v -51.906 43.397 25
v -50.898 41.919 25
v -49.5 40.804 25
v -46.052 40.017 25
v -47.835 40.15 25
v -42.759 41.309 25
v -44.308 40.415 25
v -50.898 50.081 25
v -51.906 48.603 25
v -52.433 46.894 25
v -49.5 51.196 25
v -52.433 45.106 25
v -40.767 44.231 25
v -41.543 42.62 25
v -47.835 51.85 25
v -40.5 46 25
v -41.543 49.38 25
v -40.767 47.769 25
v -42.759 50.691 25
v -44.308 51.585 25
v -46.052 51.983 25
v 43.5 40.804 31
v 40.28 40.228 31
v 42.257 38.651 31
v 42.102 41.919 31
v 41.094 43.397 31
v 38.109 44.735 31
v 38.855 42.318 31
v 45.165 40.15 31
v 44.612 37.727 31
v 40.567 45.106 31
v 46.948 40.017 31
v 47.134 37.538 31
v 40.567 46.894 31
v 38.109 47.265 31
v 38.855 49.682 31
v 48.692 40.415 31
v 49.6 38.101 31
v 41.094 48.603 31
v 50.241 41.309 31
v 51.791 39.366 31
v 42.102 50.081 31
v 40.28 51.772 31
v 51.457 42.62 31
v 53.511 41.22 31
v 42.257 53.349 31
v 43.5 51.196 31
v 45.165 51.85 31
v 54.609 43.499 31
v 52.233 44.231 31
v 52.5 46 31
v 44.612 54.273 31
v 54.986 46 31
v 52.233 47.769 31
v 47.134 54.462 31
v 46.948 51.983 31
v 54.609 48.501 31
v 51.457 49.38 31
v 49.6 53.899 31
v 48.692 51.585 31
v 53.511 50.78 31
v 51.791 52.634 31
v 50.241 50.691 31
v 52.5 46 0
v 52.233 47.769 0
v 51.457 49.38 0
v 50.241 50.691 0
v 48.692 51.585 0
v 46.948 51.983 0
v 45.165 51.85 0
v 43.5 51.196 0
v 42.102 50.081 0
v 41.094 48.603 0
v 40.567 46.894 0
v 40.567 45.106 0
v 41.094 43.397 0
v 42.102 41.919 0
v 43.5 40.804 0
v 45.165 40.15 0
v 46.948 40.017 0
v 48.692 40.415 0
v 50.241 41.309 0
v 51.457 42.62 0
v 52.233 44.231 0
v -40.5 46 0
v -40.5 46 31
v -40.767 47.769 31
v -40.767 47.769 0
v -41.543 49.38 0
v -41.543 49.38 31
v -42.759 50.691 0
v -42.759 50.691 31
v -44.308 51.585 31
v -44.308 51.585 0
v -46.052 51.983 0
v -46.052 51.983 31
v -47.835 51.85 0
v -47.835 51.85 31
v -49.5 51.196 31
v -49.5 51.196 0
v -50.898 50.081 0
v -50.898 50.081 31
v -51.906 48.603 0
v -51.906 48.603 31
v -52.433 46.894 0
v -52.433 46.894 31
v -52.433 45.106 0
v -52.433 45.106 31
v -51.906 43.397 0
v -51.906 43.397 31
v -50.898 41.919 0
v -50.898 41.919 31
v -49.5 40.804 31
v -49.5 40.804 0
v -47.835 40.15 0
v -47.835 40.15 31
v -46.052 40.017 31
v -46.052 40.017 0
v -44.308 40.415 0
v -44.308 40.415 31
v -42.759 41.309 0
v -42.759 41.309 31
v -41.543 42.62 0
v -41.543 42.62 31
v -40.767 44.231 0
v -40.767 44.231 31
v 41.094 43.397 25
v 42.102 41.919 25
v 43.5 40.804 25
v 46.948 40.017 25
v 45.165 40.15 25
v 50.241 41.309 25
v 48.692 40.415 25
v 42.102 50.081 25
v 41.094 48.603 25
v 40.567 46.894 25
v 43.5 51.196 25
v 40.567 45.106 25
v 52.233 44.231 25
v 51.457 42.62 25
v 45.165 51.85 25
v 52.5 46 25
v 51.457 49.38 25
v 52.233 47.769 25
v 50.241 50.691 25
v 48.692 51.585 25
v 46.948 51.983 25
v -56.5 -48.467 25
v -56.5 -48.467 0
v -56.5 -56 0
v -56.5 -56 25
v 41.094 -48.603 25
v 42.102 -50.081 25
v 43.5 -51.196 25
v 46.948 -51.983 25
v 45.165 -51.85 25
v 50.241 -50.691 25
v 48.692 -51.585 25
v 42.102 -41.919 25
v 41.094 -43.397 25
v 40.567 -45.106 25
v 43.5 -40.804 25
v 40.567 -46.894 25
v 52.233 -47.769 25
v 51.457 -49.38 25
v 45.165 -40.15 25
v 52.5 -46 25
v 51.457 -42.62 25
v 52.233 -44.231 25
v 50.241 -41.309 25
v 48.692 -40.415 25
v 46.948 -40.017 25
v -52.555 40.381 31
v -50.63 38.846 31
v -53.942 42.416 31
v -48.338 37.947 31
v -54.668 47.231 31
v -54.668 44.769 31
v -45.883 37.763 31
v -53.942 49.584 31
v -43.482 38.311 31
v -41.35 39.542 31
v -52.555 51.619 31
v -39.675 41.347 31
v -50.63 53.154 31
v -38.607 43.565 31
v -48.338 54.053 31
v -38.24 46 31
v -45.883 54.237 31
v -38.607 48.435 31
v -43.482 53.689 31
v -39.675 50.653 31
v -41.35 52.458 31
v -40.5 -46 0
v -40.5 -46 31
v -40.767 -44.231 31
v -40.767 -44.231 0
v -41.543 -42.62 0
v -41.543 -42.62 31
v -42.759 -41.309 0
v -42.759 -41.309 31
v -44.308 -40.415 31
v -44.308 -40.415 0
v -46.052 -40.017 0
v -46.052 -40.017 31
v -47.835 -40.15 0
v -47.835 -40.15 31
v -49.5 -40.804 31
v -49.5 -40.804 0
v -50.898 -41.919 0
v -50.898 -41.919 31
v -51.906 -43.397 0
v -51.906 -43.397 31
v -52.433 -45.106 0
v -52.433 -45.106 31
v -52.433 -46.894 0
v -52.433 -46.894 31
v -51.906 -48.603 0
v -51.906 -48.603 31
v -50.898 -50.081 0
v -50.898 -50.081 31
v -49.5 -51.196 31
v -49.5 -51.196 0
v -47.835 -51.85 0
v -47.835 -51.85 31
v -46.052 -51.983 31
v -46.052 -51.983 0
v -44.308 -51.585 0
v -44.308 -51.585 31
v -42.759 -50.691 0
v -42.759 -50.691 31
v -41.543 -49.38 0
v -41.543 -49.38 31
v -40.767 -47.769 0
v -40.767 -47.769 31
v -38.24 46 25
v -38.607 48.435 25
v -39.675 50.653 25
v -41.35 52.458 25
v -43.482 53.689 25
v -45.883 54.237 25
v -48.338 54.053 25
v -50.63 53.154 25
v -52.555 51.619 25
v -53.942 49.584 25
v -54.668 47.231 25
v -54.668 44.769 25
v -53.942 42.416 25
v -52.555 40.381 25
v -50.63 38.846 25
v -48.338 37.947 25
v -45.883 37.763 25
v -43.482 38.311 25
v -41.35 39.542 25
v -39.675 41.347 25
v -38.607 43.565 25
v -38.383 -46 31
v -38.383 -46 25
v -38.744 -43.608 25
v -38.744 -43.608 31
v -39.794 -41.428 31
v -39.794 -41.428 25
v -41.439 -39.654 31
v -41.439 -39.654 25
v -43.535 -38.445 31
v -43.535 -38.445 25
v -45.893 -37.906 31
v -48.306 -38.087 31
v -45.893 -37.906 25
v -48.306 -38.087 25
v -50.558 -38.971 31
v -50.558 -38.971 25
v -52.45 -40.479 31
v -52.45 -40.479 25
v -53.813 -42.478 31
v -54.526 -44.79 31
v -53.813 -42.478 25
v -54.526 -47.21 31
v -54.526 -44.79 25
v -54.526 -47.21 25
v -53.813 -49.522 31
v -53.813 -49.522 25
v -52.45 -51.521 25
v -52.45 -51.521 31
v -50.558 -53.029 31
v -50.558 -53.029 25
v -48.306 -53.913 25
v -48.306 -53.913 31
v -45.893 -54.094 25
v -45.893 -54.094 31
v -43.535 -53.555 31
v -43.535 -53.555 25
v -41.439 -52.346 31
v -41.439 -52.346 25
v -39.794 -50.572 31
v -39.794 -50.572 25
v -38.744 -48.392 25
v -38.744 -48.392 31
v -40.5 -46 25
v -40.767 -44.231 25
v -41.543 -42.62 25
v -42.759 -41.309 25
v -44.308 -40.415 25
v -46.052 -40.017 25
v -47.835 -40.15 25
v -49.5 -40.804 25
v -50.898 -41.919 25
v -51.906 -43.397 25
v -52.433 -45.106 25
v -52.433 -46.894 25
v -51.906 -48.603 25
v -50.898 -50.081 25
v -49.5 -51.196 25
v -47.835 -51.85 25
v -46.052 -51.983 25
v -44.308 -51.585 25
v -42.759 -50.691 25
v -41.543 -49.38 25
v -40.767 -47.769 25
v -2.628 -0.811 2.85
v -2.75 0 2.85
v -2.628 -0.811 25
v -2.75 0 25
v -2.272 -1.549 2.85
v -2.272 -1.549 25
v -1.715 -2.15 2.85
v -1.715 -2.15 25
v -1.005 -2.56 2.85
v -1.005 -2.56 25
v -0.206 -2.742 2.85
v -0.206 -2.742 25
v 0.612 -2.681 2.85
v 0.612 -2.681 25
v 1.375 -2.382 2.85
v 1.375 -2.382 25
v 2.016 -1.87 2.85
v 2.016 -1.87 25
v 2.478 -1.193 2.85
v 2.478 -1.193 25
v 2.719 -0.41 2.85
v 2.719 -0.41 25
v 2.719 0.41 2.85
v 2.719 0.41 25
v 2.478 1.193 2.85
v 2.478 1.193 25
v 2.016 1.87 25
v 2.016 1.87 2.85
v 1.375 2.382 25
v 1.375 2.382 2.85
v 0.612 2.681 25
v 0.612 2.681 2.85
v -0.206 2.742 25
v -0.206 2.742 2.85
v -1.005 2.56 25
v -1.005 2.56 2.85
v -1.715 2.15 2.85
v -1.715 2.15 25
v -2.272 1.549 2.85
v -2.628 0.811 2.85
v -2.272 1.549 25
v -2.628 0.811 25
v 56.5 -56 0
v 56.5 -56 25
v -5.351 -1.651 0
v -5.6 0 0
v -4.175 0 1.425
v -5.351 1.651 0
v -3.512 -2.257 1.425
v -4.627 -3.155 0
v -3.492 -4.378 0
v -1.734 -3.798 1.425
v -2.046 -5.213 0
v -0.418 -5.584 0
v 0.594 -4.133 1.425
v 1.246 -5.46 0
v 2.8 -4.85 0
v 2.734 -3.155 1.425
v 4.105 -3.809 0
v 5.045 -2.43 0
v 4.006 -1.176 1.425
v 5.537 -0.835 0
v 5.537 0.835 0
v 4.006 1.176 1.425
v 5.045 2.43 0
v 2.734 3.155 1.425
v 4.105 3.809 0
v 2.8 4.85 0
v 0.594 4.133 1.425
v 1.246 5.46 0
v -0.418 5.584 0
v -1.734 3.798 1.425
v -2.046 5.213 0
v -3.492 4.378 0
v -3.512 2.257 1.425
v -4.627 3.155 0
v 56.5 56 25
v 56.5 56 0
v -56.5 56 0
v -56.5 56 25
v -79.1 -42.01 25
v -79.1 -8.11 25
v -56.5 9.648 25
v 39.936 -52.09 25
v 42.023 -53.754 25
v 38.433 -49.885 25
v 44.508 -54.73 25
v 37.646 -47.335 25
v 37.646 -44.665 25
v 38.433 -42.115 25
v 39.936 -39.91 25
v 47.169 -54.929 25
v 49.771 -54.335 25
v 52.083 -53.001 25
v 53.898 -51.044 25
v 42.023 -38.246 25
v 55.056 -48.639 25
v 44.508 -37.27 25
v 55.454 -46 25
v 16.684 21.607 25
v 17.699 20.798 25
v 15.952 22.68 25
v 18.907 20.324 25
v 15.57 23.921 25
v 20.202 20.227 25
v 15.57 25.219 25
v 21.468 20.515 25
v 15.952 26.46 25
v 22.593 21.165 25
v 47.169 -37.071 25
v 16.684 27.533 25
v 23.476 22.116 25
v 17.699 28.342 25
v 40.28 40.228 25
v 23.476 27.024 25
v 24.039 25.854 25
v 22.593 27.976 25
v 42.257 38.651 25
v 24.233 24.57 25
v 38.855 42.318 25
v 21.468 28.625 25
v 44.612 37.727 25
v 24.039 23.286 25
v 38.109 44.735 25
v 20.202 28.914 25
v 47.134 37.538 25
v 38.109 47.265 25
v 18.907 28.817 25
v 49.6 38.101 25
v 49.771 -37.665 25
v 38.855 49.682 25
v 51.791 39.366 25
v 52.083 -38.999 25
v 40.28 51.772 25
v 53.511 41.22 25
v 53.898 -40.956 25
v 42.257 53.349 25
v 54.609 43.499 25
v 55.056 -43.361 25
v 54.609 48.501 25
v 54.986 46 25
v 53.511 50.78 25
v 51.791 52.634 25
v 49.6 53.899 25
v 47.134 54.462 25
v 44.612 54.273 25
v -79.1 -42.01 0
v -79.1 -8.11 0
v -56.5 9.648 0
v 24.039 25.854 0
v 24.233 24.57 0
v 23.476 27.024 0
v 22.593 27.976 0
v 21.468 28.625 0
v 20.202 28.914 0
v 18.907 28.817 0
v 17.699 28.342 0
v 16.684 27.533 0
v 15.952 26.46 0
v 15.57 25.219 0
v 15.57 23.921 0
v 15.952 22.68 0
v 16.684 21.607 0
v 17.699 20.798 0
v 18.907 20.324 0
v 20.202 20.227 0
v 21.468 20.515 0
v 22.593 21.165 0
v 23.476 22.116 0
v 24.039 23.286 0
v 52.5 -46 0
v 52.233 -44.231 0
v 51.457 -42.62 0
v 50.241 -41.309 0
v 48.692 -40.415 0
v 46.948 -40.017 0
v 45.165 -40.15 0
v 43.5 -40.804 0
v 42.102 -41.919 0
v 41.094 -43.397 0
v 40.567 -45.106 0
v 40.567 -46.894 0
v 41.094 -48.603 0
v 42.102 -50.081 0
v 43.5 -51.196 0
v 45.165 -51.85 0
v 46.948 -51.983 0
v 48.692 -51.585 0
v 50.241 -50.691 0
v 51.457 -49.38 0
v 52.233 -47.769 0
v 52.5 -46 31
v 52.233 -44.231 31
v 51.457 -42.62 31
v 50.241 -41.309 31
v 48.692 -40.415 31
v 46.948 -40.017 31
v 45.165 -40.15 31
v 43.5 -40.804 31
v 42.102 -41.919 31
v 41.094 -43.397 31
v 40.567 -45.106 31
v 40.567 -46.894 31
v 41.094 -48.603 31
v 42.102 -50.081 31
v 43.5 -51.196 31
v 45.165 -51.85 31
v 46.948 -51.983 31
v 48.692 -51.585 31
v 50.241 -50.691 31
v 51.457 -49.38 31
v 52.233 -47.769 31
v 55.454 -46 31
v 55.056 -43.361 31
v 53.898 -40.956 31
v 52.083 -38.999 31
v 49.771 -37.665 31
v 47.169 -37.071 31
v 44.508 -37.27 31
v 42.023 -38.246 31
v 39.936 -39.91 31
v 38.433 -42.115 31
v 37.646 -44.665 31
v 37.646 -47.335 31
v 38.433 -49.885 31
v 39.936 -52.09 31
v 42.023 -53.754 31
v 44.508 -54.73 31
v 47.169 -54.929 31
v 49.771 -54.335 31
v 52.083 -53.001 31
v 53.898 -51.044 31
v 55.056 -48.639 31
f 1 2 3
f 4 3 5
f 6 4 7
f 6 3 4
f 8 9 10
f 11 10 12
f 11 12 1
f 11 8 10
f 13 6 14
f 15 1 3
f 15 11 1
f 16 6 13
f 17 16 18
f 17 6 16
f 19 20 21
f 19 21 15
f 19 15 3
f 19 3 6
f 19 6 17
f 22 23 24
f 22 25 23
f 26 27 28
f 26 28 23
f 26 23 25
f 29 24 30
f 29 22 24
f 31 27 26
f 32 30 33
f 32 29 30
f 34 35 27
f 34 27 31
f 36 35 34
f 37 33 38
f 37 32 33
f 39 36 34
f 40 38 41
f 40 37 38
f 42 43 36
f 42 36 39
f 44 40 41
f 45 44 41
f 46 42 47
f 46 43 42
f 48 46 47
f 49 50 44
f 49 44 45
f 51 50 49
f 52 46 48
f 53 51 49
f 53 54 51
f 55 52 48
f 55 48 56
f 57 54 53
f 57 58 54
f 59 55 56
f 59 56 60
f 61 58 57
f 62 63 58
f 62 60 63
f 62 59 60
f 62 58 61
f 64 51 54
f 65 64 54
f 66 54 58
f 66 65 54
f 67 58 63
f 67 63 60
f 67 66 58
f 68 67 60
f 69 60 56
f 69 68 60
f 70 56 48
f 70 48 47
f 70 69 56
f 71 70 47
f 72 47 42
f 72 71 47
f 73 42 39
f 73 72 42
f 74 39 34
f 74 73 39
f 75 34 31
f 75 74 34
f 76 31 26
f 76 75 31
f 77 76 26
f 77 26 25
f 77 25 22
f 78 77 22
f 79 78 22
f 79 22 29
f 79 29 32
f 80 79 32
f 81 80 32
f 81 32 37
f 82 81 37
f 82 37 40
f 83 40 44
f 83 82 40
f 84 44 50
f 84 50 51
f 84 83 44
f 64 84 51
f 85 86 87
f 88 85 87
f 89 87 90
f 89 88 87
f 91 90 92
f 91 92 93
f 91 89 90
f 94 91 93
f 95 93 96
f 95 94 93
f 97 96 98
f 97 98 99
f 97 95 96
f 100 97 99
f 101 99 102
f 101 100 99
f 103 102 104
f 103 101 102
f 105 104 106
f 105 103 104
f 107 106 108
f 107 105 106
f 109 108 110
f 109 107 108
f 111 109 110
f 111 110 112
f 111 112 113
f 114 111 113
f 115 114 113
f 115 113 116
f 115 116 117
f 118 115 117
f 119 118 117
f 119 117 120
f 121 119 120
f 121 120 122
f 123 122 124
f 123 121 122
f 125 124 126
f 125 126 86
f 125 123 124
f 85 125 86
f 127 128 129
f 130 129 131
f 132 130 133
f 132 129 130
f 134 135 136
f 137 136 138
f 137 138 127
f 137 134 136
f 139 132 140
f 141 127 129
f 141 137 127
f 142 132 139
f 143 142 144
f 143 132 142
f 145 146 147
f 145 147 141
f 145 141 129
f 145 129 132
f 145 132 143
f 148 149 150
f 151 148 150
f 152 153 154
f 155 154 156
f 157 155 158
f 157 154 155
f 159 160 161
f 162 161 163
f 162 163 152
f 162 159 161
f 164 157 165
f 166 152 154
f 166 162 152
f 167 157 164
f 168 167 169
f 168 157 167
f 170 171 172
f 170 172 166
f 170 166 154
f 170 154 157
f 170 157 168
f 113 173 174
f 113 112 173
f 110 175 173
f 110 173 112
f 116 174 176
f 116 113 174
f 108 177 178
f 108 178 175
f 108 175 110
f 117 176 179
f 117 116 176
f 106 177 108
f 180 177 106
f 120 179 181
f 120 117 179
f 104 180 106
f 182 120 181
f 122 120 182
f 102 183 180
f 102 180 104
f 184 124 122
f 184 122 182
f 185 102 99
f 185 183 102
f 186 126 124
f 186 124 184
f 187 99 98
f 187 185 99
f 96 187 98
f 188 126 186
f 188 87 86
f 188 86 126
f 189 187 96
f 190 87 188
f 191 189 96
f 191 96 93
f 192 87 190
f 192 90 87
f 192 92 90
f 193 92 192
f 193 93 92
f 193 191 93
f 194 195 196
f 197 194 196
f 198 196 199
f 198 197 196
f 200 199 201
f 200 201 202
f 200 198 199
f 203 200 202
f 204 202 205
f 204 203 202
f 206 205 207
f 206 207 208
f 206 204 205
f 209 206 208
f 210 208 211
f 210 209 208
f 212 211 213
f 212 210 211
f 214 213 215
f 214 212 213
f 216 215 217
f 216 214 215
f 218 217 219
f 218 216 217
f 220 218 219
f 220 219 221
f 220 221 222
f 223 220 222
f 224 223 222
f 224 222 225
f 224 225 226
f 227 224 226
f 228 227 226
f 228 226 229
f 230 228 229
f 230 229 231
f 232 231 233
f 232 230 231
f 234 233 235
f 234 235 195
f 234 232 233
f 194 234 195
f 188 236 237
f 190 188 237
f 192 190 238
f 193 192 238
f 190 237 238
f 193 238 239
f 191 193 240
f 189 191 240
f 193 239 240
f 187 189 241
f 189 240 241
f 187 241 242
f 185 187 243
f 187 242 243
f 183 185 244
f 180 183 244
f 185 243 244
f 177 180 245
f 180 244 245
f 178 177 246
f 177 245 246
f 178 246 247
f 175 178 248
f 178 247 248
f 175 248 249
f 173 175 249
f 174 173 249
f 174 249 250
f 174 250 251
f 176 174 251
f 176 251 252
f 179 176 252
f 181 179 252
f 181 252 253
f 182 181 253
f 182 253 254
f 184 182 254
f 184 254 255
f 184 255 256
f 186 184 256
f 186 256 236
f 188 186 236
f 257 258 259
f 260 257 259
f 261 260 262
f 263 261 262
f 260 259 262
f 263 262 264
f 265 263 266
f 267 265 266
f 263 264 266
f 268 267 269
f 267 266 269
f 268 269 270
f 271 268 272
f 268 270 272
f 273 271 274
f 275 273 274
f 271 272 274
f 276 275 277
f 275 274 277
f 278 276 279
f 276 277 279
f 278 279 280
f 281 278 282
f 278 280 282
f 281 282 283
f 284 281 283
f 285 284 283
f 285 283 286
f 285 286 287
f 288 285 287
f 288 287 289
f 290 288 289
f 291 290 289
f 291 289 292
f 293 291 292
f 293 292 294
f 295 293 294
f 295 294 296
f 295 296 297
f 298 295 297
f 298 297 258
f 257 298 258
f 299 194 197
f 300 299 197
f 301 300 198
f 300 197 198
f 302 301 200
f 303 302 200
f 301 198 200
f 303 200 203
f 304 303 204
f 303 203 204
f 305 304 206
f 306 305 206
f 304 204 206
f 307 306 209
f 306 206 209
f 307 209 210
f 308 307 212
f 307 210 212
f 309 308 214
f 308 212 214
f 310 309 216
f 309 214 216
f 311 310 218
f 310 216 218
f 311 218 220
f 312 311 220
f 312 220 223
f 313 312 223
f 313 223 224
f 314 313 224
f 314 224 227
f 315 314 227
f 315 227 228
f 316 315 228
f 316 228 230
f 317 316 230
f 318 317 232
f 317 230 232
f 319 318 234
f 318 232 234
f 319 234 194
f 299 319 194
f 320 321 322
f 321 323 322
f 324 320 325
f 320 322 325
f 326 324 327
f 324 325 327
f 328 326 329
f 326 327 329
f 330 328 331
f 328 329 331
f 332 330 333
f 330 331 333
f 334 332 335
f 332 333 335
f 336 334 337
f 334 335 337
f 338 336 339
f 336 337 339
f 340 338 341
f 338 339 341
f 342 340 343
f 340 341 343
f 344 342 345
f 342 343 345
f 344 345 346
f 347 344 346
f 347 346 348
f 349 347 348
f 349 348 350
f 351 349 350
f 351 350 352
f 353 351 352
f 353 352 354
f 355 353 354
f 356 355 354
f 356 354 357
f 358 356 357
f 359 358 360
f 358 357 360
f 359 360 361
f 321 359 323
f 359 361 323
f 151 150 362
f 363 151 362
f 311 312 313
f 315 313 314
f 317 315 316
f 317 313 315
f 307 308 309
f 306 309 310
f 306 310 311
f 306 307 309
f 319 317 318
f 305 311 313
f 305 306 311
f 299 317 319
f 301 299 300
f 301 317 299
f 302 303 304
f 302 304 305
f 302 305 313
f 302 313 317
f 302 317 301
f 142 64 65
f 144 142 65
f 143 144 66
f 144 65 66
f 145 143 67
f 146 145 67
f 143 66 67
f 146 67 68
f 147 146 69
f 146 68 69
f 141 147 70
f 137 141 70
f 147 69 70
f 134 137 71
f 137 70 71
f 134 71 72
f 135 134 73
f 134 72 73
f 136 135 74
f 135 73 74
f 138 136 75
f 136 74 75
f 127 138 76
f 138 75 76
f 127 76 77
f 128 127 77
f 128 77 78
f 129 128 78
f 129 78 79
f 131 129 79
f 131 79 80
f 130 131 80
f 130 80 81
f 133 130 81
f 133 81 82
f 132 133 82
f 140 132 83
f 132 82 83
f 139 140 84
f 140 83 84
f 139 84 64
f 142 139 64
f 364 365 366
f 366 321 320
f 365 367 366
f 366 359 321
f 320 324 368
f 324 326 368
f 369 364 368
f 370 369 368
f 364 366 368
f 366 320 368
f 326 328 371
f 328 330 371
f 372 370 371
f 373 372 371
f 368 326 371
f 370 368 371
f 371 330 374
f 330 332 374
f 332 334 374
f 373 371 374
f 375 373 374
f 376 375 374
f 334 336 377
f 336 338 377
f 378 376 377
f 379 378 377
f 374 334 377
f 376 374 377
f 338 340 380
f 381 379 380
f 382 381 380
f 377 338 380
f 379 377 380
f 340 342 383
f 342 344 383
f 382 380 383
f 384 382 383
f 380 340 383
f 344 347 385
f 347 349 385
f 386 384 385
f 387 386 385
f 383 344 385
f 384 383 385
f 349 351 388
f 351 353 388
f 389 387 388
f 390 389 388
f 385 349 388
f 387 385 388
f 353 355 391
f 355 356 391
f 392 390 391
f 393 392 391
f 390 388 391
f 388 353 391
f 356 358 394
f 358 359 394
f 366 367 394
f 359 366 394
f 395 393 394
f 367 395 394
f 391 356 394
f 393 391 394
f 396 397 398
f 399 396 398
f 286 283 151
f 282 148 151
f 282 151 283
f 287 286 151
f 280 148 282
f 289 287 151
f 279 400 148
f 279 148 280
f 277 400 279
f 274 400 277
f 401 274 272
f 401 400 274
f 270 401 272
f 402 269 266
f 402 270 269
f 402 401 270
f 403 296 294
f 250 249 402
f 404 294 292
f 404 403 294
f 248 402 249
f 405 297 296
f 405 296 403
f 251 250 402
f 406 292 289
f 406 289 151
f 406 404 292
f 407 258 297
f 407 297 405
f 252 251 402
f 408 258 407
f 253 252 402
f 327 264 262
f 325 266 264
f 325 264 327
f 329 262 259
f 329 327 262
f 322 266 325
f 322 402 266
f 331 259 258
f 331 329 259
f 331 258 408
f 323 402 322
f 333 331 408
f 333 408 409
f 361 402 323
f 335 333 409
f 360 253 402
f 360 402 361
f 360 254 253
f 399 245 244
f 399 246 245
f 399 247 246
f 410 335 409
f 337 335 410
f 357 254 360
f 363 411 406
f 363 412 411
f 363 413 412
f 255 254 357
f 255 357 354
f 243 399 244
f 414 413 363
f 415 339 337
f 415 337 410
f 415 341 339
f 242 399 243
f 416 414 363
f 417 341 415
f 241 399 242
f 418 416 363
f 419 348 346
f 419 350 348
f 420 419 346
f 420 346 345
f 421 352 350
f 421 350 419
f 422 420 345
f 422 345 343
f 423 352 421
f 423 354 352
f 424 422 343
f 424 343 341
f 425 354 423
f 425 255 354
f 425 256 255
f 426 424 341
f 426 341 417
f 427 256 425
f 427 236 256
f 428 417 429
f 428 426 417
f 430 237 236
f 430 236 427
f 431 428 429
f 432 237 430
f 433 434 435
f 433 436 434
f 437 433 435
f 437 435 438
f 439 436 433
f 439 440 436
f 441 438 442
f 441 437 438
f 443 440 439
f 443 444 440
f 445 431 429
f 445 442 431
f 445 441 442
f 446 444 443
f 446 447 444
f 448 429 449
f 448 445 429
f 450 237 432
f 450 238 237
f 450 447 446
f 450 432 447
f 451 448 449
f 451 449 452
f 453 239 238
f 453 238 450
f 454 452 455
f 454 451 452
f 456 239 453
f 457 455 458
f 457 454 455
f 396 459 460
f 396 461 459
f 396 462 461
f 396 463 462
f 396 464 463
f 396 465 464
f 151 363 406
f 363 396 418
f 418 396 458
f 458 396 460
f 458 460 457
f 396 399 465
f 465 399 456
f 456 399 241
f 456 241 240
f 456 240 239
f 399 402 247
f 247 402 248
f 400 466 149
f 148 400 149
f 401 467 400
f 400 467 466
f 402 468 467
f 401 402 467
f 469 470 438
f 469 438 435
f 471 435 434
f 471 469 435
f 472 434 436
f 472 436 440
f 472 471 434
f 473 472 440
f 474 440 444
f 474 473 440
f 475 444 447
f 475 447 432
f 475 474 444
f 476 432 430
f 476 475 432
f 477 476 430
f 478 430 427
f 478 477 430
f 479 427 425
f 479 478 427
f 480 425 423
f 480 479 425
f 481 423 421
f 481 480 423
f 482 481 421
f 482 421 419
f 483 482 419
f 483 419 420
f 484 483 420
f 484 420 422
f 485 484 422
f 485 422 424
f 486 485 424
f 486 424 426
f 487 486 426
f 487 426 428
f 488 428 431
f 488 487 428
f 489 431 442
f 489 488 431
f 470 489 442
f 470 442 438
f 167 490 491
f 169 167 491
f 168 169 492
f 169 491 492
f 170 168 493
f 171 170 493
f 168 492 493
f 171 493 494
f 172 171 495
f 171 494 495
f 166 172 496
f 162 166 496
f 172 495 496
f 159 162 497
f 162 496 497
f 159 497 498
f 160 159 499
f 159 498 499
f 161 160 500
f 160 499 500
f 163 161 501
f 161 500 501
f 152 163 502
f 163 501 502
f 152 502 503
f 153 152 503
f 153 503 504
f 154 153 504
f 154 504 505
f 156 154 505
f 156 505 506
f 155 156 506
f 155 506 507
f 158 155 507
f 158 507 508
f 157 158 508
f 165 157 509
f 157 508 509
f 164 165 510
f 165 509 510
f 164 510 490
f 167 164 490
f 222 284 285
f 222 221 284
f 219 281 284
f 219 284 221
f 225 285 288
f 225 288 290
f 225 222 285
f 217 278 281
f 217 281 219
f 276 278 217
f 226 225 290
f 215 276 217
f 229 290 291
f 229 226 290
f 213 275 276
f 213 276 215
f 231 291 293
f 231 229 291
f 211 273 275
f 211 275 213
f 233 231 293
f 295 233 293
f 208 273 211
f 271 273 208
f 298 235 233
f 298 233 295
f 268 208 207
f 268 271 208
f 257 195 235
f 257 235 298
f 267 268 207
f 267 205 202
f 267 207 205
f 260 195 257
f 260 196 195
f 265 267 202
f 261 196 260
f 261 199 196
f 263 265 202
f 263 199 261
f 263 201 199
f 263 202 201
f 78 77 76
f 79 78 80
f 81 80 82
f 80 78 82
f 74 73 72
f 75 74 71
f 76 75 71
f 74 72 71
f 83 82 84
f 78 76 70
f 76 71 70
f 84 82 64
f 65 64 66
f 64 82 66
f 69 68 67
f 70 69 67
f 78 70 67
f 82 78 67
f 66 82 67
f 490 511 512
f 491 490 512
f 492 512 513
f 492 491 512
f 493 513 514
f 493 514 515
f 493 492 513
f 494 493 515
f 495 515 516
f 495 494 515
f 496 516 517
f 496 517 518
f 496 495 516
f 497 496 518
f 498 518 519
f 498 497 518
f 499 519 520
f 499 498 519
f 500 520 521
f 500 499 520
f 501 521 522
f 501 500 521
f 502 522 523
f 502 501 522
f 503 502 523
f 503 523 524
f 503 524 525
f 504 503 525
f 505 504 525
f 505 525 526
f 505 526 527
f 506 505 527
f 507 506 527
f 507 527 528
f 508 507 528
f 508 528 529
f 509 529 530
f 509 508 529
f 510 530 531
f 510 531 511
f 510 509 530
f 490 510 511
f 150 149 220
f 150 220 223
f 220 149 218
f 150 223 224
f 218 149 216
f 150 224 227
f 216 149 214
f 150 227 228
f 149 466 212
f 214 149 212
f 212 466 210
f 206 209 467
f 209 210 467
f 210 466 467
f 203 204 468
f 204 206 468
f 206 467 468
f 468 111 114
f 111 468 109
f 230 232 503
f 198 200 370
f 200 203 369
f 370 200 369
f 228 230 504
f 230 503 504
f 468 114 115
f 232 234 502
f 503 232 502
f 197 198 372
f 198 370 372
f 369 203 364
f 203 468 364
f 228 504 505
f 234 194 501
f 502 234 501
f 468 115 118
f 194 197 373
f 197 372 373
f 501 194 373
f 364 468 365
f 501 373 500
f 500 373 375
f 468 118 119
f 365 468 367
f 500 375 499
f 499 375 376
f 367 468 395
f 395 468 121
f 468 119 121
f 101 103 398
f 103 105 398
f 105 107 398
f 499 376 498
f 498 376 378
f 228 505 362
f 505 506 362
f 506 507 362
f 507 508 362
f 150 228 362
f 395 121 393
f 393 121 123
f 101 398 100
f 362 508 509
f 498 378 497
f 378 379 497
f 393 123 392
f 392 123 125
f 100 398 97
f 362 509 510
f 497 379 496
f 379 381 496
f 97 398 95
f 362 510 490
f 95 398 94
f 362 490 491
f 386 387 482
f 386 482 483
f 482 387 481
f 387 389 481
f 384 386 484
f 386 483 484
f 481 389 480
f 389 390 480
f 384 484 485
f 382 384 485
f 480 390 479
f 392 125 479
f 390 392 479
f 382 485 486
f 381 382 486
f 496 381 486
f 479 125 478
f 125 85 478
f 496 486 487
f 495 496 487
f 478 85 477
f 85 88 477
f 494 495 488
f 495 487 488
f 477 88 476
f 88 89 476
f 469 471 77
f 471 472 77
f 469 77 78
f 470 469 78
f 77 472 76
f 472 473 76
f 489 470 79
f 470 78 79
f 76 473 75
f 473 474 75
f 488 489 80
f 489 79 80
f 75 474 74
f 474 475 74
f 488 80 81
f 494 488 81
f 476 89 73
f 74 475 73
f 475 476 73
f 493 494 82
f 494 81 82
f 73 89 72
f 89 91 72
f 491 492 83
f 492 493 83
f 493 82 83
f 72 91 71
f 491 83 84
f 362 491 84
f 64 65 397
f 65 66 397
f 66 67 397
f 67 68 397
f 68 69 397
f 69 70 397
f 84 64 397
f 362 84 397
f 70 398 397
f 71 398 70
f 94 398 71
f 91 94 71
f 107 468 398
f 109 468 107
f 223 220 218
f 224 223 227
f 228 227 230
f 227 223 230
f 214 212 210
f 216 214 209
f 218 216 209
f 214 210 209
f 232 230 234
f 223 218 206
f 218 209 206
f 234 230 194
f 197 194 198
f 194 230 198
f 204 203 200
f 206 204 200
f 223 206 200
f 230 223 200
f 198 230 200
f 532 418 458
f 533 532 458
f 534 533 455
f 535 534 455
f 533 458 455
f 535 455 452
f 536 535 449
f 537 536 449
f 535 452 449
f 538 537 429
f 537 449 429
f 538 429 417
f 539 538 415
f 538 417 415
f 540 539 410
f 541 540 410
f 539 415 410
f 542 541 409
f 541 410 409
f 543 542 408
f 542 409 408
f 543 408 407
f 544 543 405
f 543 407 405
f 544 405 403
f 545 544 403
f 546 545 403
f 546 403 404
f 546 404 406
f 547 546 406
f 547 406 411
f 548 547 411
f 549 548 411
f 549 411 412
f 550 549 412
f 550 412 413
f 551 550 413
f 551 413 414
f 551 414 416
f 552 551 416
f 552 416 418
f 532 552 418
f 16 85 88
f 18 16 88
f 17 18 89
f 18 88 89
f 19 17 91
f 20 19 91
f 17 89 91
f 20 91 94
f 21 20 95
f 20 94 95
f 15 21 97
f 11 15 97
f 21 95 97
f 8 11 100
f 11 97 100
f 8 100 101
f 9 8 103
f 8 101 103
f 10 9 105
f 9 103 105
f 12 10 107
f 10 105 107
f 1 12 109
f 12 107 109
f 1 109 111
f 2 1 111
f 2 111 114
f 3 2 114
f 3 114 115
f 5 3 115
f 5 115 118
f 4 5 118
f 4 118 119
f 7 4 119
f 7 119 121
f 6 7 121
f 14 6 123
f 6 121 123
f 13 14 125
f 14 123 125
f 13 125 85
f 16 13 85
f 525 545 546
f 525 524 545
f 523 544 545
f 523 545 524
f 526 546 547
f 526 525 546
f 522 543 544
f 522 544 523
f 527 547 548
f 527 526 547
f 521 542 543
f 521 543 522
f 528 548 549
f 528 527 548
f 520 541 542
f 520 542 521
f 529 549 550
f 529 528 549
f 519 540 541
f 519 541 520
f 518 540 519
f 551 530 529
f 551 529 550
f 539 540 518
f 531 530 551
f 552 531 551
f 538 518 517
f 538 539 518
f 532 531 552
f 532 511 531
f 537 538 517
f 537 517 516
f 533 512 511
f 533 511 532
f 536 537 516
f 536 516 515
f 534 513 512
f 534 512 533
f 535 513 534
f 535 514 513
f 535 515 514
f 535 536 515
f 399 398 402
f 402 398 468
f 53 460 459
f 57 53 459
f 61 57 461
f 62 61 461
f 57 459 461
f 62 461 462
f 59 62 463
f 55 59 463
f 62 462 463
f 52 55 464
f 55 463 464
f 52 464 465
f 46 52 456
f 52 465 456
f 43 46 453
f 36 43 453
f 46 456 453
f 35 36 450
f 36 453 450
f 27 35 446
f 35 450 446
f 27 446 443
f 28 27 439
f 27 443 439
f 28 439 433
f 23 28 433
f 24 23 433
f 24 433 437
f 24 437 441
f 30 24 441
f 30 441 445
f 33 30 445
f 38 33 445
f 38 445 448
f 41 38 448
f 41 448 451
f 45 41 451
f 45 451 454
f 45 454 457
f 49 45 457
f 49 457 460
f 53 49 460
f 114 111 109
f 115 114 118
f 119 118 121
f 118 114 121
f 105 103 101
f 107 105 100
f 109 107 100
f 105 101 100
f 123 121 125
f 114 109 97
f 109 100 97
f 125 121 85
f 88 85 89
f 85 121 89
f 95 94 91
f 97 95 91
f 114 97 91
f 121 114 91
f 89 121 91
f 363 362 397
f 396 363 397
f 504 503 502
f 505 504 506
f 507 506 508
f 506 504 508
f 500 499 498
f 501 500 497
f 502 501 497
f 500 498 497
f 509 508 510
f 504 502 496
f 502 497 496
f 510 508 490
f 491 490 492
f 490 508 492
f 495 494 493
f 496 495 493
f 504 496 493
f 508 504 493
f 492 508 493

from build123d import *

# Parameters (mm, degrees)
F0_R           = 8.1165547555
F0_R_2         = 8.9540708035
F0_R_3         = 8.2604689148
F0_R_4         = 8.4855933961
F1_DEPTH       = 25
F0_R_5         = 6
F2_DEPTH       = 31
F3_R           = 4.3558335705
F4_DEPTH       = 25
F5_D           = 5.5
F5_CSINK_D     = 11.2
F5_CSINK_ANGLE = 90


with BuildPart() as f1:
    # F0 (on Top) → F1 (new body)
    with BuildSketch(Plane.XY):
        Polygon((-56.5, -56), (56.5, -56), (56.5, 56), (-56.5, 56), (-56.5, 9.6476091864), (-56.5, -48.4666682311), align=None)
        with Locations((-46.5, -46)):
            Circle(F0_R, mode=Mode.SUBTRACT)
        with Locations((46.5, -46)):
            Circle(F0_R_2, mode=Mode.SUBTRACT)
        with Locations((-46.5, 46)):
            Circle(F0_R_3, mode=Mode.SUBTRACT)
        with Locations((46.5, 46)):
            Circle(F0_R_4, mode=Mode.SUBTRACT)
        Polygon((-79.0999777075, -42.0095233626), (-56.5, -48.4666682311), (-56.5, 9.6476091864), (-79.0999777075, -8.1095304023), align=None)
    extrude(amount=F1_DEPTH)

    # F0 (on Top) → F2 (join)
    with BuildSketch(Plane.XY):
        with Locations((-46.5, -46)):
            Circle(F0_R)
        with Locations((-46.5, -46)):
            Circle(F0_R_5, mode=Mode.SUBTRACT)
        with Locations((46.5, -46)):
            Circle(F0_R_2)
        with Locations((46.5, -46)):
            Circle(F0_R_5, mode=Mode.SUBTRACT)
        with Locations((46.5, 46)):
            Circle(F0_R_4)
        with Locations((46.5, 46)):
            Circle(F0_R_5, mode=Mode.SUBTRACT)
        with Locations((-46.5, 46)):
            Circle(F0_R_3)
        with Locations((-46.5, 46)):
            Circle(F0_R_5, mode=Mode.SUBTRACT)
    extrude(amount=F2_DEPTH)

    # F3 (on Top) → F4 (cut, through all)
    with BuildSketch(Plane.XY):
        with Locations((19.8767594993, 24.5702005923)):
            Circle(F3_R)
    extrude(amount=F4_DEPTH, mode=Mode.SUBTRACT)

    # F5 (through all)
    with Locations(Plane(origin=(0, 0, 0), x_dir=(1, 0, 0), z_dir=(0, 0, -1))):
        with Locations((0, 0)):
            CounterSinkHole(F5_D / 2, F5_CSINK_D / 2, counter_sink_angle=F5_CSINK_ANGLE)


with BuildPart() as f1b:
    # F0 (on Top) → F1, piece 2 (new body)
    with BuildSketch(Plane.XY):
        with Locations((-46.5, 46)):
            Circle(F0_R_5)
    extrude(amount=F1_DEPTH)


with BuildPart() as f1c:
    # F0 (on Top) → F1, piece 3 (new body)
    with BuildSketch(Plane.XY):
        with Locations((46.5, 46)):
            Circle(F0_R_5)
    extrude(amount=F1_DEPTH)


with BuildPart() as f1d:
    # F0 (on Top) → F1, piece 4 (new body)
    with BuildSketch(Plane.XY):
        with Locations((46.5, -46)):
            Circle(F0_R_5)
    extrude(amount=F1_DEPTH)


with BuildPart() as f1e:
    # F0 (on Top) → F1, piece 5 (new body)
    with BuildSketch(Plane.XY):
        with Locations((-46.5, -46)):
            Circle(F0_R_5)
    extrude(amount=F1_DEPTH)


solid = Compound([f1.part, f1b.part, f1c.part, f1d.part, f1e.part])
